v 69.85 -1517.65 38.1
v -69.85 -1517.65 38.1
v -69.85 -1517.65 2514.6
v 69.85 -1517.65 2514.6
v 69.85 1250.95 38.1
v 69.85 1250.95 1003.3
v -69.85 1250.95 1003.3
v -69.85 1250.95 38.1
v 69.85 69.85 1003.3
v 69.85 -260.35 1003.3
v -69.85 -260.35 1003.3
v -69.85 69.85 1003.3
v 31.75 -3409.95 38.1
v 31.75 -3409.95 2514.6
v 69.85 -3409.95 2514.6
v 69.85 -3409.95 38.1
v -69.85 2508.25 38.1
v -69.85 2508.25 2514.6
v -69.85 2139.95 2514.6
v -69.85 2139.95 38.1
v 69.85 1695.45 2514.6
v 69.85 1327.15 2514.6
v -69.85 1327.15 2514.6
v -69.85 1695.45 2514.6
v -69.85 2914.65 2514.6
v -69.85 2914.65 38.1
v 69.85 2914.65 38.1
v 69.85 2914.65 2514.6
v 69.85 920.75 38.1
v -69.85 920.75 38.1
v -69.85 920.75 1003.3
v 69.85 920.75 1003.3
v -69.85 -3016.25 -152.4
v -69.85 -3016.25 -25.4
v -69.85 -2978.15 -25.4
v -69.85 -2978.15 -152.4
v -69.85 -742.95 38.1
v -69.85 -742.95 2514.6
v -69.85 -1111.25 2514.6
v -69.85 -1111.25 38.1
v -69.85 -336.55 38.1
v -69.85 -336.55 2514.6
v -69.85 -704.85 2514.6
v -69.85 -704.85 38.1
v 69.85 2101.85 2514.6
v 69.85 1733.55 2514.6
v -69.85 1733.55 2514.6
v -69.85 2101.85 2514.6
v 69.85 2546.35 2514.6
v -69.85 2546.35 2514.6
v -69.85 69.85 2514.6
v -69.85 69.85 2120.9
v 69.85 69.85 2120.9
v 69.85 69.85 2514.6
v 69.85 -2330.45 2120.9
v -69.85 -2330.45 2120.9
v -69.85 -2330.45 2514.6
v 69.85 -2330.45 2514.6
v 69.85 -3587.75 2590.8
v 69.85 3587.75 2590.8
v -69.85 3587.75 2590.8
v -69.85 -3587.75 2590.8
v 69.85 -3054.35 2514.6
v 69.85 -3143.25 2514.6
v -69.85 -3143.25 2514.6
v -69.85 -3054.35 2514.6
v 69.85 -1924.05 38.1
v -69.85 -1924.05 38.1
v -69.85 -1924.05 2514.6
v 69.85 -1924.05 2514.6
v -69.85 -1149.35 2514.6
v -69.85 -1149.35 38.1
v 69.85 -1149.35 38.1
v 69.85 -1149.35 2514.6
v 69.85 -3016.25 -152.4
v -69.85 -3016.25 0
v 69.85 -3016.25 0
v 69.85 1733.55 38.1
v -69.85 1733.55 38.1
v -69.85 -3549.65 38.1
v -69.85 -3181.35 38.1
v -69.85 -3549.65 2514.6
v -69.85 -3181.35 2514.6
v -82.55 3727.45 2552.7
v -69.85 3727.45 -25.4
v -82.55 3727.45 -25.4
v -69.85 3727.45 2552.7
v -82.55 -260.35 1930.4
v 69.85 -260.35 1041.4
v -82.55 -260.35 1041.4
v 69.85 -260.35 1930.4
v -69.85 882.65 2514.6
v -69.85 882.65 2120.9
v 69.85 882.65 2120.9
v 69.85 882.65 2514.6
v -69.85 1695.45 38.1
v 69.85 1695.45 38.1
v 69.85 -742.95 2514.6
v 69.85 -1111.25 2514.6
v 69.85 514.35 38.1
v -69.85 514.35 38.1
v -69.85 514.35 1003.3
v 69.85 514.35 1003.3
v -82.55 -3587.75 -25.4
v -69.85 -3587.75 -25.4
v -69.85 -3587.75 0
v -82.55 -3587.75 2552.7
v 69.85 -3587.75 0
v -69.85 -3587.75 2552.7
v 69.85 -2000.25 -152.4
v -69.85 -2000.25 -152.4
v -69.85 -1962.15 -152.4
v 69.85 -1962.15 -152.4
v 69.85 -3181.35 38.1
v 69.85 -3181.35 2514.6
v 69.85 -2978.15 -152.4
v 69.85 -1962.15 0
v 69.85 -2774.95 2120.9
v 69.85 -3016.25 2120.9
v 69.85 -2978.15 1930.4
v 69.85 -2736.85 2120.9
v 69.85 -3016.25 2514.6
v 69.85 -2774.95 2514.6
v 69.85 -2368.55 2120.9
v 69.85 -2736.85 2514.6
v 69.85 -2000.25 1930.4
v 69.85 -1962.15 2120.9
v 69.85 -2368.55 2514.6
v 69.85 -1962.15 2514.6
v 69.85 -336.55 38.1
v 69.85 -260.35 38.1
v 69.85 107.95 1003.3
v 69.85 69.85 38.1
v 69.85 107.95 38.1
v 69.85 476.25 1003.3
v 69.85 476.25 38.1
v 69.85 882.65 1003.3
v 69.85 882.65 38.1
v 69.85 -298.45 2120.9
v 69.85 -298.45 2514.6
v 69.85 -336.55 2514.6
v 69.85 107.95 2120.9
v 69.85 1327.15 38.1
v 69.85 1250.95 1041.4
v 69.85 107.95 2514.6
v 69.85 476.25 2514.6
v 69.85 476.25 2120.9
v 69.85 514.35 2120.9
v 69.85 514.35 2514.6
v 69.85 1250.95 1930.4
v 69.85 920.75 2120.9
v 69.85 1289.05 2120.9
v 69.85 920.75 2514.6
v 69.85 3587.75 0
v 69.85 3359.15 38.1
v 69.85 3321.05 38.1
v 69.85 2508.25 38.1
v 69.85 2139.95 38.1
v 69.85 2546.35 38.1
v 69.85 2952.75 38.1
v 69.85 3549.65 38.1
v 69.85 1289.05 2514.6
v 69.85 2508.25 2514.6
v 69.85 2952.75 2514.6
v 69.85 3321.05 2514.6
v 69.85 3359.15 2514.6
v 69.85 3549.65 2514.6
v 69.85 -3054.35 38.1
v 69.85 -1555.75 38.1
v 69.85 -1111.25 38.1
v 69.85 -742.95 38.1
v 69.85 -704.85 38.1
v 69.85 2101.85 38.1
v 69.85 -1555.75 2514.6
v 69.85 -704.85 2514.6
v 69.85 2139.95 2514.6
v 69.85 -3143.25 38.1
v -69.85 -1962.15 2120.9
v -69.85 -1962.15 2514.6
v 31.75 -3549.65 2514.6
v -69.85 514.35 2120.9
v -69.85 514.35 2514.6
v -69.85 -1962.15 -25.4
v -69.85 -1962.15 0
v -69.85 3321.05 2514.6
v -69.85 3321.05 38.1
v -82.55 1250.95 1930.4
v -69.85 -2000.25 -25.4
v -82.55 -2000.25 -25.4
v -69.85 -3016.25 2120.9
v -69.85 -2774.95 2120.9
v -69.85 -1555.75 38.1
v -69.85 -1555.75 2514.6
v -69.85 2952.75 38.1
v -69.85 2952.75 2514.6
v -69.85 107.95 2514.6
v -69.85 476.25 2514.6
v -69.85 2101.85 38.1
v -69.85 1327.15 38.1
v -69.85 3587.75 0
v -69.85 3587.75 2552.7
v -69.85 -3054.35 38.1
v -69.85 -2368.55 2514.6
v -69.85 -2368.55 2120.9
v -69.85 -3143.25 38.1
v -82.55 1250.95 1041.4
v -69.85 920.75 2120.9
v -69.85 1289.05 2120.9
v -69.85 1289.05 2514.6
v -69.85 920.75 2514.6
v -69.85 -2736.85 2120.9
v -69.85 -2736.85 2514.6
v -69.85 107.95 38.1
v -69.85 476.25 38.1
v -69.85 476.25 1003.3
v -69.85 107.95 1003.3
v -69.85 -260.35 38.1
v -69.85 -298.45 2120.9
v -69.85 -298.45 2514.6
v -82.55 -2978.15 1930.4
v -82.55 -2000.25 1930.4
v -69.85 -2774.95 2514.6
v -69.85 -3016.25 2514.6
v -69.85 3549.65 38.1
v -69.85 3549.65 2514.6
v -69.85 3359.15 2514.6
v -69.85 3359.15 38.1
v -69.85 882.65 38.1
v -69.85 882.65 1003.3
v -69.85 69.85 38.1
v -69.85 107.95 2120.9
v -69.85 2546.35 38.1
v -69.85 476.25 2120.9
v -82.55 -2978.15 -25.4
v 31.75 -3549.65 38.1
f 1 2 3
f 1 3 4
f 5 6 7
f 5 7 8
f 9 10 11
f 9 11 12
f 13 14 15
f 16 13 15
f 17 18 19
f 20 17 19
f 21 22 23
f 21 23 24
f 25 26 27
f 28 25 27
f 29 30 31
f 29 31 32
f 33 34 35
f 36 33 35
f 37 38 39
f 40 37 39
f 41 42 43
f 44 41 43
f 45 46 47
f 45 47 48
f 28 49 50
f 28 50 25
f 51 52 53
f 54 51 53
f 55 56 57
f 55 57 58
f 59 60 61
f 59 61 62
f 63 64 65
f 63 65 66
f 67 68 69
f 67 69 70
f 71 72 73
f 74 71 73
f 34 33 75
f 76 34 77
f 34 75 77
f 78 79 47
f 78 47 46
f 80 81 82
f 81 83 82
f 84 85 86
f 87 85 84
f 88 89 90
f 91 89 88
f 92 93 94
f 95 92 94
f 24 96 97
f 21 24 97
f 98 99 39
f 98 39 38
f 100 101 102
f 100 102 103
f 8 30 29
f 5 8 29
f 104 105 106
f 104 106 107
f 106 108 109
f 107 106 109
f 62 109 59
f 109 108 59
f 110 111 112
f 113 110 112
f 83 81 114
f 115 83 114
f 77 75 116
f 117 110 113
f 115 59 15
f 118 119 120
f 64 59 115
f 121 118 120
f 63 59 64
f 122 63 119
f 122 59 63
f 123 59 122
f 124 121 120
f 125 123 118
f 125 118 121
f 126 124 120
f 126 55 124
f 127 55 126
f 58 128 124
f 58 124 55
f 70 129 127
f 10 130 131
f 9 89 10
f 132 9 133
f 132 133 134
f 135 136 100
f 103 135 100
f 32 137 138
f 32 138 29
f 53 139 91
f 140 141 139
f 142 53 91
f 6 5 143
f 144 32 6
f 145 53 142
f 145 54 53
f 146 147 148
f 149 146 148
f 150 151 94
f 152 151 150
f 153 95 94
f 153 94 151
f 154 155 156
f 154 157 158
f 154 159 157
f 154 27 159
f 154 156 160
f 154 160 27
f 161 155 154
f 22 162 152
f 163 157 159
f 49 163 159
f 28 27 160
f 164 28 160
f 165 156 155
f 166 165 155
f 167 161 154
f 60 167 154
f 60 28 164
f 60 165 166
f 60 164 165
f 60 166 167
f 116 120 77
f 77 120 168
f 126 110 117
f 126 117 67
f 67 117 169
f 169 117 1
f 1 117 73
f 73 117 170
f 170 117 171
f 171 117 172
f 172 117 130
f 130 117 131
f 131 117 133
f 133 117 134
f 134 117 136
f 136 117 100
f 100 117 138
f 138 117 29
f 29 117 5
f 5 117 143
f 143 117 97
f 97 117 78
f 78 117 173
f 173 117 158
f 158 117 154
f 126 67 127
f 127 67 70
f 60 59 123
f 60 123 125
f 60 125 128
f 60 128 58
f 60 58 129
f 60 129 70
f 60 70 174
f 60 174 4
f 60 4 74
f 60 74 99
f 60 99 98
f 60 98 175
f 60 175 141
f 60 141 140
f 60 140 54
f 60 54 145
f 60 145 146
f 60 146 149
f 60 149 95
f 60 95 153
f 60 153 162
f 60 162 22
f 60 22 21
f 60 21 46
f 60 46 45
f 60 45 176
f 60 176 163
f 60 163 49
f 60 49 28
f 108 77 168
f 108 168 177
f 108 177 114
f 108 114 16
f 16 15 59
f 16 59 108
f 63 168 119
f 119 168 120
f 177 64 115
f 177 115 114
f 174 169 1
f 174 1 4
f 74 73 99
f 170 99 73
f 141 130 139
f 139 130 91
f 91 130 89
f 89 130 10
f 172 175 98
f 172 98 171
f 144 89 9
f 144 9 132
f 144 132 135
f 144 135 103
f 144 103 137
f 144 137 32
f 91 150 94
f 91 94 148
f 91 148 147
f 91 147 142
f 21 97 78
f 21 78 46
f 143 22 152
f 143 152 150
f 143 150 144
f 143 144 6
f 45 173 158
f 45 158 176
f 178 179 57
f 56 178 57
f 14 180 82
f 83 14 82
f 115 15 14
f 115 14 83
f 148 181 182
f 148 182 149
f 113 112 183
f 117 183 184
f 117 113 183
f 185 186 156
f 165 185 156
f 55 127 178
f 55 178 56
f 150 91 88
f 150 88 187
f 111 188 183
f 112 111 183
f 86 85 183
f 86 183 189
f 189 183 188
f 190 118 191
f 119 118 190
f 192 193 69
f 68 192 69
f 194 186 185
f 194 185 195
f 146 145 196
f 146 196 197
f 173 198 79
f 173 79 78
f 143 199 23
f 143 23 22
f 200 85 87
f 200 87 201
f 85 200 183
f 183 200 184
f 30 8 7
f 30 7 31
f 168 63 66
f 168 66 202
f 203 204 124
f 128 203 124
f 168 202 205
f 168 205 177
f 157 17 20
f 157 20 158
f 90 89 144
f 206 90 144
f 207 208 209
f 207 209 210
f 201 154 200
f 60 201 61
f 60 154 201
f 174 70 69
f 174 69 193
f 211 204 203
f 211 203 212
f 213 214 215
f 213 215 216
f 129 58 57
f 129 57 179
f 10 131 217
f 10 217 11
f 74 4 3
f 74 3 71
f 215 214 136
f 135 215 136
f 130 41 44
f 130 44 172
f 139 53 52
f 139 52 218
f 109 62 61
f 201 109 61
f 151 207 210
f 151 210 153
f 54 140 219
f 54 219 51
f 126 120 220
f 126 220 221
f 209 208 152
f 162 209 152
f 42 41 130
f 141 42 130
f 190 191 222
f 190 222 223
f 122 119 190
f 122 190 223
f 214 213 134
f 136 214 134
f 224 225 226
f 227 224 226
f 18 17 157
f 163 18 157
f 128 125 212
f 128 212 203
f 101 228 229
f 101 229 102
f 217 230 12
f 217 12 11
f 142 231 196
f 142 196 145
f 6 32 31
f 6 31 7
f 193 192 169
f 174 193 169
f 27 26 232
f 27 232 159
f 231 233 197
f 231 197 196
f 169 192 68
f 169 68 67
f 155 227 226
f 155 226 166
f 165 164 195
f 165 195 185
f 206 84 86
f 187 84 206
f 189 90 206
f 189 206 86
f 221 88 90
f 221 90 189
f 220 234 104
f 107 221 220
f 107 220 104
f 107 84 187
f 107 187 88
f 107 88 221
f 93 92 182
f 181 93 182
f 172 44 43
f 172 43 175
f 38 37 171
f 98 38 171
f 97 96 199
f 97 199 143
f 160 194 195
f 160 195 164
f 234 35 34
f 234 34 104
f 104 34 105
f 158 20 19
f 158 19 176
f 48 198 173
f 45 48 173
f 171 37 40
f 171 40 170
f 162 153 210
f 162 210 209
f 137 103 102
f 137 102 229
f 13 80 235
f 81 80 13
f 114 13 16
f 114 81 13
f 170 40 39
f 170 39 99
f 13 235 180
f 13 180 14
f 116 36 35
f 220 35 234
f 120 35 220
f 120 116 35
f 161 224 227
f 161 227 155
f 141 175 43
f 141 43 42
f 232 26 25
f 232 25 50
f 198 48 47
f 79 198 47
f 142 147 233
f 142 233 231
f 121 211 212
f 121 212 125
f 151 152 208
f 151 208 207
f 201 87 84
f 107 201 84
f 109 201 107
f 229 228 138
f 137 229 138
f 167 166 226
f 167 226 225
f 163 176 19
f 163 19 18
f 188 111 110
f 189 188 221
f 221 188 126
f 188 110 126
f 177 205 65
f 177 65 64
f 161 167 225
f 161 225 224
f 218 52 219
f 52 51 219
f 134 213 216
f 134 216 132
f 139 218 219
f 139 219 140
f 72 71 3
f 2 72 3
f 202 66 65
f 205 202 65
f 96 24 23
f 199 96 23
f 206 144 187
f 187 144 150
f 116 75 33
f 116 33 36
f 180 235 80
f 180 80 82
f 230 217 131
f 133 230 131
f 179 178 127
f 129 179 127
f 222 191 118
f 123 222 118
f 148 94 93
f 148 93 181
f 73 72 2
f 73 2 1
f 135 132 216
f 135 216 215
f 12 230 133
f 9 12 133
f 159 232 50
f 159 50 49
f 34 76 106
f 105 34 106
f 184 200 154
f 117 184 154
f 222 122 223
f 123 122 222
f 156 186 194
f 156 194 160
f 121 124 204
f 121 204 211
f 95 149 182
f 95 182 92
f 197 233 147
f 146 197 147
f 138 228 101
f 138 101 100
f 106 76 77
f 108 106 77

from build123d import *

# Parameters (mm, degrees)
F0_W      = 139.7
F0_H      = 7175.5
F1_DEPTH  = 38.1
F3_DEPTH  = 139.7
F4_W      = 139.7
F4_H      = 38.1
F4_W_2    = 38.1
F4_H_2    = 139.7
F5_DEPTH  = 2476.5
F6_W      = 1511.3
F6_H      = 889
F6_W_2    = 38.1
F6_H_2    = 152.4
F7_DEPTH  = 139.7
F8_W      = 7315.2
F8_H      = 2578.1
F9_DEPTH  = 12.7
F10_W     = 1511.3
F10_H     = 889
F10_W_2   = 977.9
F10_H_2   = 2082.8
F11_DEPTH = 152.401


with BuildPart() as f1:
    # F0 (on Top) → F1 (new body)
    with BuildSketch(Plane.XY):
        Rectangle(F0_W, F0_H)
    extrude(amount=F1_DEPTH)

    # F2 (on face) → F3 (join, through all)
    with BuildSketch(Plane.YZ.offset(69.85)):
        Polygon((3587.75, 2590.8), (-3587.75, 2590.8), (-3587.75, 38.1), (-3549.65, 38.1), (-3549.65, 2514.6), (3549.65, 2514.6), (3549.65, 38.1), (3587.75, 38.1), align=None)
    extrude(amount=-F3_DEPTH)

    # F4 (on face) → F5 (join, through all)
    with BuildSketch(Plane.XY.offset(38.1)):
        with Locations((0, -3162.3)):
            Rectangle(F4_W, F4_H)
        with Locations((0, -2755.9)):
            Rectangle(F4_W, F4_H)
        with Locations((0, -2349.5)):
            Rectangle(F4_W, F4_H)
        with Locations((0, -1943.1)):
            Rectangle(F4_W, F4_H)
        with Locations((0, -1536.7)):
            Rectangle(F4_W, F4_H)
        with Locations((0, -1130.3)):
            Rectangle(F4_W, F4_H)
        with Locations((0, -723.9)):
            Rectangle(F4_W, F4_H)
        with Locations((0, -317.5)):
            Rectangle(F4_W, F4_H)
        with Locations((0, 88.9)):
            Rectangle(F4_W, F4_H)
        with Locations((0, 495.3)):
            Rectangle(F4_W, F4_H)
        with Locations((0, 901.7)):
            Rectangle(F4_W, F4_H)
        with Locations((0, 1308.1)):
            Rectangle(F4_W, F4_H)
        with Locations((0, 1714.5)):
            Rectangle(F4_W, F4_H)
        with Locations((0, 2120.9)):
            Rectangle(F4_W, F4_H)
        with Locations((0, 2527.3)):
            Rectangle(F4_W, F4_H)
        with Locations((0, 2933.7)):
            Rectangle(F4_W, F4_H)
        with Locations((0, 3340.1)):
            Rectangle(F4_W, F4_H)
        with Locations((50.8, -3479.8)):
            Rectangle(F4_W_2, F4_H_2)
    extrude(amount=F5_DEPTH)

    # F6 (on face) → F7 (join)
    with BuildSketch(Plane.YZ.offset(69.85)):
        Polygon((-3054.35, 2514.6), (-3054.35, 38.1), (-2978.15, 38.1), (-2978.15, 1930.4), (-2000.25, 1930.4), (-2000.25, 38.1), (-1962.15, 38.1), (-1962.15, 2120.9), (-3016.25, 2120.9), (-3016.25, 2514.6), align=None)
        Polygon((-260.35, 38.1), (-260.35, 1003.3), (1250.95, 1003.3), (1250.95, 38.1), (1289.05, 38.1), (1289.05, 2120.9), (-298.45, 2120.9), (-298.45, 38.1), align=None)
        with Locations((495.3, 1485.9)):
            Rectangle(F6_W, F6_H, mode=Mode.SUBTRACT)
        with Locations((-2997.2, -76.2)):
            Rectangle(F6_W_2, F6_H_2)
        with Locations((-1981.2, -76.2)):
            Rectangle(F6_W_2, F6_H_2)
    extrude(amount=-F7_DEPTH)

    # F8 (on face) → F9 (join)
    with BuildSketch(Plane(origin=(-69.85, 0, 0), x_dir=(0, -1, 0), z_dir=(-1, 0, 0))):
        with Locations((-69.85, 1263.65)):
            Rectangle(F8_W, F8_H)
    extrude(amount=F9_DEPTH)

    # F10 (on face) → F11 (cut, through all)
    with BuildSketch(Plane.YZ.offset(69.85)):
        with Locations((495.3, 1485.9)):
            Rectangle(F10_W, F10_H)
        with Locations((-2489.2, 889)):
            Rectangle(F10_W_2, F10_H_2)
    extrude(amount=-F11_DEPTH, mode=Mode.SUBTRACT)


solid = f1.part
